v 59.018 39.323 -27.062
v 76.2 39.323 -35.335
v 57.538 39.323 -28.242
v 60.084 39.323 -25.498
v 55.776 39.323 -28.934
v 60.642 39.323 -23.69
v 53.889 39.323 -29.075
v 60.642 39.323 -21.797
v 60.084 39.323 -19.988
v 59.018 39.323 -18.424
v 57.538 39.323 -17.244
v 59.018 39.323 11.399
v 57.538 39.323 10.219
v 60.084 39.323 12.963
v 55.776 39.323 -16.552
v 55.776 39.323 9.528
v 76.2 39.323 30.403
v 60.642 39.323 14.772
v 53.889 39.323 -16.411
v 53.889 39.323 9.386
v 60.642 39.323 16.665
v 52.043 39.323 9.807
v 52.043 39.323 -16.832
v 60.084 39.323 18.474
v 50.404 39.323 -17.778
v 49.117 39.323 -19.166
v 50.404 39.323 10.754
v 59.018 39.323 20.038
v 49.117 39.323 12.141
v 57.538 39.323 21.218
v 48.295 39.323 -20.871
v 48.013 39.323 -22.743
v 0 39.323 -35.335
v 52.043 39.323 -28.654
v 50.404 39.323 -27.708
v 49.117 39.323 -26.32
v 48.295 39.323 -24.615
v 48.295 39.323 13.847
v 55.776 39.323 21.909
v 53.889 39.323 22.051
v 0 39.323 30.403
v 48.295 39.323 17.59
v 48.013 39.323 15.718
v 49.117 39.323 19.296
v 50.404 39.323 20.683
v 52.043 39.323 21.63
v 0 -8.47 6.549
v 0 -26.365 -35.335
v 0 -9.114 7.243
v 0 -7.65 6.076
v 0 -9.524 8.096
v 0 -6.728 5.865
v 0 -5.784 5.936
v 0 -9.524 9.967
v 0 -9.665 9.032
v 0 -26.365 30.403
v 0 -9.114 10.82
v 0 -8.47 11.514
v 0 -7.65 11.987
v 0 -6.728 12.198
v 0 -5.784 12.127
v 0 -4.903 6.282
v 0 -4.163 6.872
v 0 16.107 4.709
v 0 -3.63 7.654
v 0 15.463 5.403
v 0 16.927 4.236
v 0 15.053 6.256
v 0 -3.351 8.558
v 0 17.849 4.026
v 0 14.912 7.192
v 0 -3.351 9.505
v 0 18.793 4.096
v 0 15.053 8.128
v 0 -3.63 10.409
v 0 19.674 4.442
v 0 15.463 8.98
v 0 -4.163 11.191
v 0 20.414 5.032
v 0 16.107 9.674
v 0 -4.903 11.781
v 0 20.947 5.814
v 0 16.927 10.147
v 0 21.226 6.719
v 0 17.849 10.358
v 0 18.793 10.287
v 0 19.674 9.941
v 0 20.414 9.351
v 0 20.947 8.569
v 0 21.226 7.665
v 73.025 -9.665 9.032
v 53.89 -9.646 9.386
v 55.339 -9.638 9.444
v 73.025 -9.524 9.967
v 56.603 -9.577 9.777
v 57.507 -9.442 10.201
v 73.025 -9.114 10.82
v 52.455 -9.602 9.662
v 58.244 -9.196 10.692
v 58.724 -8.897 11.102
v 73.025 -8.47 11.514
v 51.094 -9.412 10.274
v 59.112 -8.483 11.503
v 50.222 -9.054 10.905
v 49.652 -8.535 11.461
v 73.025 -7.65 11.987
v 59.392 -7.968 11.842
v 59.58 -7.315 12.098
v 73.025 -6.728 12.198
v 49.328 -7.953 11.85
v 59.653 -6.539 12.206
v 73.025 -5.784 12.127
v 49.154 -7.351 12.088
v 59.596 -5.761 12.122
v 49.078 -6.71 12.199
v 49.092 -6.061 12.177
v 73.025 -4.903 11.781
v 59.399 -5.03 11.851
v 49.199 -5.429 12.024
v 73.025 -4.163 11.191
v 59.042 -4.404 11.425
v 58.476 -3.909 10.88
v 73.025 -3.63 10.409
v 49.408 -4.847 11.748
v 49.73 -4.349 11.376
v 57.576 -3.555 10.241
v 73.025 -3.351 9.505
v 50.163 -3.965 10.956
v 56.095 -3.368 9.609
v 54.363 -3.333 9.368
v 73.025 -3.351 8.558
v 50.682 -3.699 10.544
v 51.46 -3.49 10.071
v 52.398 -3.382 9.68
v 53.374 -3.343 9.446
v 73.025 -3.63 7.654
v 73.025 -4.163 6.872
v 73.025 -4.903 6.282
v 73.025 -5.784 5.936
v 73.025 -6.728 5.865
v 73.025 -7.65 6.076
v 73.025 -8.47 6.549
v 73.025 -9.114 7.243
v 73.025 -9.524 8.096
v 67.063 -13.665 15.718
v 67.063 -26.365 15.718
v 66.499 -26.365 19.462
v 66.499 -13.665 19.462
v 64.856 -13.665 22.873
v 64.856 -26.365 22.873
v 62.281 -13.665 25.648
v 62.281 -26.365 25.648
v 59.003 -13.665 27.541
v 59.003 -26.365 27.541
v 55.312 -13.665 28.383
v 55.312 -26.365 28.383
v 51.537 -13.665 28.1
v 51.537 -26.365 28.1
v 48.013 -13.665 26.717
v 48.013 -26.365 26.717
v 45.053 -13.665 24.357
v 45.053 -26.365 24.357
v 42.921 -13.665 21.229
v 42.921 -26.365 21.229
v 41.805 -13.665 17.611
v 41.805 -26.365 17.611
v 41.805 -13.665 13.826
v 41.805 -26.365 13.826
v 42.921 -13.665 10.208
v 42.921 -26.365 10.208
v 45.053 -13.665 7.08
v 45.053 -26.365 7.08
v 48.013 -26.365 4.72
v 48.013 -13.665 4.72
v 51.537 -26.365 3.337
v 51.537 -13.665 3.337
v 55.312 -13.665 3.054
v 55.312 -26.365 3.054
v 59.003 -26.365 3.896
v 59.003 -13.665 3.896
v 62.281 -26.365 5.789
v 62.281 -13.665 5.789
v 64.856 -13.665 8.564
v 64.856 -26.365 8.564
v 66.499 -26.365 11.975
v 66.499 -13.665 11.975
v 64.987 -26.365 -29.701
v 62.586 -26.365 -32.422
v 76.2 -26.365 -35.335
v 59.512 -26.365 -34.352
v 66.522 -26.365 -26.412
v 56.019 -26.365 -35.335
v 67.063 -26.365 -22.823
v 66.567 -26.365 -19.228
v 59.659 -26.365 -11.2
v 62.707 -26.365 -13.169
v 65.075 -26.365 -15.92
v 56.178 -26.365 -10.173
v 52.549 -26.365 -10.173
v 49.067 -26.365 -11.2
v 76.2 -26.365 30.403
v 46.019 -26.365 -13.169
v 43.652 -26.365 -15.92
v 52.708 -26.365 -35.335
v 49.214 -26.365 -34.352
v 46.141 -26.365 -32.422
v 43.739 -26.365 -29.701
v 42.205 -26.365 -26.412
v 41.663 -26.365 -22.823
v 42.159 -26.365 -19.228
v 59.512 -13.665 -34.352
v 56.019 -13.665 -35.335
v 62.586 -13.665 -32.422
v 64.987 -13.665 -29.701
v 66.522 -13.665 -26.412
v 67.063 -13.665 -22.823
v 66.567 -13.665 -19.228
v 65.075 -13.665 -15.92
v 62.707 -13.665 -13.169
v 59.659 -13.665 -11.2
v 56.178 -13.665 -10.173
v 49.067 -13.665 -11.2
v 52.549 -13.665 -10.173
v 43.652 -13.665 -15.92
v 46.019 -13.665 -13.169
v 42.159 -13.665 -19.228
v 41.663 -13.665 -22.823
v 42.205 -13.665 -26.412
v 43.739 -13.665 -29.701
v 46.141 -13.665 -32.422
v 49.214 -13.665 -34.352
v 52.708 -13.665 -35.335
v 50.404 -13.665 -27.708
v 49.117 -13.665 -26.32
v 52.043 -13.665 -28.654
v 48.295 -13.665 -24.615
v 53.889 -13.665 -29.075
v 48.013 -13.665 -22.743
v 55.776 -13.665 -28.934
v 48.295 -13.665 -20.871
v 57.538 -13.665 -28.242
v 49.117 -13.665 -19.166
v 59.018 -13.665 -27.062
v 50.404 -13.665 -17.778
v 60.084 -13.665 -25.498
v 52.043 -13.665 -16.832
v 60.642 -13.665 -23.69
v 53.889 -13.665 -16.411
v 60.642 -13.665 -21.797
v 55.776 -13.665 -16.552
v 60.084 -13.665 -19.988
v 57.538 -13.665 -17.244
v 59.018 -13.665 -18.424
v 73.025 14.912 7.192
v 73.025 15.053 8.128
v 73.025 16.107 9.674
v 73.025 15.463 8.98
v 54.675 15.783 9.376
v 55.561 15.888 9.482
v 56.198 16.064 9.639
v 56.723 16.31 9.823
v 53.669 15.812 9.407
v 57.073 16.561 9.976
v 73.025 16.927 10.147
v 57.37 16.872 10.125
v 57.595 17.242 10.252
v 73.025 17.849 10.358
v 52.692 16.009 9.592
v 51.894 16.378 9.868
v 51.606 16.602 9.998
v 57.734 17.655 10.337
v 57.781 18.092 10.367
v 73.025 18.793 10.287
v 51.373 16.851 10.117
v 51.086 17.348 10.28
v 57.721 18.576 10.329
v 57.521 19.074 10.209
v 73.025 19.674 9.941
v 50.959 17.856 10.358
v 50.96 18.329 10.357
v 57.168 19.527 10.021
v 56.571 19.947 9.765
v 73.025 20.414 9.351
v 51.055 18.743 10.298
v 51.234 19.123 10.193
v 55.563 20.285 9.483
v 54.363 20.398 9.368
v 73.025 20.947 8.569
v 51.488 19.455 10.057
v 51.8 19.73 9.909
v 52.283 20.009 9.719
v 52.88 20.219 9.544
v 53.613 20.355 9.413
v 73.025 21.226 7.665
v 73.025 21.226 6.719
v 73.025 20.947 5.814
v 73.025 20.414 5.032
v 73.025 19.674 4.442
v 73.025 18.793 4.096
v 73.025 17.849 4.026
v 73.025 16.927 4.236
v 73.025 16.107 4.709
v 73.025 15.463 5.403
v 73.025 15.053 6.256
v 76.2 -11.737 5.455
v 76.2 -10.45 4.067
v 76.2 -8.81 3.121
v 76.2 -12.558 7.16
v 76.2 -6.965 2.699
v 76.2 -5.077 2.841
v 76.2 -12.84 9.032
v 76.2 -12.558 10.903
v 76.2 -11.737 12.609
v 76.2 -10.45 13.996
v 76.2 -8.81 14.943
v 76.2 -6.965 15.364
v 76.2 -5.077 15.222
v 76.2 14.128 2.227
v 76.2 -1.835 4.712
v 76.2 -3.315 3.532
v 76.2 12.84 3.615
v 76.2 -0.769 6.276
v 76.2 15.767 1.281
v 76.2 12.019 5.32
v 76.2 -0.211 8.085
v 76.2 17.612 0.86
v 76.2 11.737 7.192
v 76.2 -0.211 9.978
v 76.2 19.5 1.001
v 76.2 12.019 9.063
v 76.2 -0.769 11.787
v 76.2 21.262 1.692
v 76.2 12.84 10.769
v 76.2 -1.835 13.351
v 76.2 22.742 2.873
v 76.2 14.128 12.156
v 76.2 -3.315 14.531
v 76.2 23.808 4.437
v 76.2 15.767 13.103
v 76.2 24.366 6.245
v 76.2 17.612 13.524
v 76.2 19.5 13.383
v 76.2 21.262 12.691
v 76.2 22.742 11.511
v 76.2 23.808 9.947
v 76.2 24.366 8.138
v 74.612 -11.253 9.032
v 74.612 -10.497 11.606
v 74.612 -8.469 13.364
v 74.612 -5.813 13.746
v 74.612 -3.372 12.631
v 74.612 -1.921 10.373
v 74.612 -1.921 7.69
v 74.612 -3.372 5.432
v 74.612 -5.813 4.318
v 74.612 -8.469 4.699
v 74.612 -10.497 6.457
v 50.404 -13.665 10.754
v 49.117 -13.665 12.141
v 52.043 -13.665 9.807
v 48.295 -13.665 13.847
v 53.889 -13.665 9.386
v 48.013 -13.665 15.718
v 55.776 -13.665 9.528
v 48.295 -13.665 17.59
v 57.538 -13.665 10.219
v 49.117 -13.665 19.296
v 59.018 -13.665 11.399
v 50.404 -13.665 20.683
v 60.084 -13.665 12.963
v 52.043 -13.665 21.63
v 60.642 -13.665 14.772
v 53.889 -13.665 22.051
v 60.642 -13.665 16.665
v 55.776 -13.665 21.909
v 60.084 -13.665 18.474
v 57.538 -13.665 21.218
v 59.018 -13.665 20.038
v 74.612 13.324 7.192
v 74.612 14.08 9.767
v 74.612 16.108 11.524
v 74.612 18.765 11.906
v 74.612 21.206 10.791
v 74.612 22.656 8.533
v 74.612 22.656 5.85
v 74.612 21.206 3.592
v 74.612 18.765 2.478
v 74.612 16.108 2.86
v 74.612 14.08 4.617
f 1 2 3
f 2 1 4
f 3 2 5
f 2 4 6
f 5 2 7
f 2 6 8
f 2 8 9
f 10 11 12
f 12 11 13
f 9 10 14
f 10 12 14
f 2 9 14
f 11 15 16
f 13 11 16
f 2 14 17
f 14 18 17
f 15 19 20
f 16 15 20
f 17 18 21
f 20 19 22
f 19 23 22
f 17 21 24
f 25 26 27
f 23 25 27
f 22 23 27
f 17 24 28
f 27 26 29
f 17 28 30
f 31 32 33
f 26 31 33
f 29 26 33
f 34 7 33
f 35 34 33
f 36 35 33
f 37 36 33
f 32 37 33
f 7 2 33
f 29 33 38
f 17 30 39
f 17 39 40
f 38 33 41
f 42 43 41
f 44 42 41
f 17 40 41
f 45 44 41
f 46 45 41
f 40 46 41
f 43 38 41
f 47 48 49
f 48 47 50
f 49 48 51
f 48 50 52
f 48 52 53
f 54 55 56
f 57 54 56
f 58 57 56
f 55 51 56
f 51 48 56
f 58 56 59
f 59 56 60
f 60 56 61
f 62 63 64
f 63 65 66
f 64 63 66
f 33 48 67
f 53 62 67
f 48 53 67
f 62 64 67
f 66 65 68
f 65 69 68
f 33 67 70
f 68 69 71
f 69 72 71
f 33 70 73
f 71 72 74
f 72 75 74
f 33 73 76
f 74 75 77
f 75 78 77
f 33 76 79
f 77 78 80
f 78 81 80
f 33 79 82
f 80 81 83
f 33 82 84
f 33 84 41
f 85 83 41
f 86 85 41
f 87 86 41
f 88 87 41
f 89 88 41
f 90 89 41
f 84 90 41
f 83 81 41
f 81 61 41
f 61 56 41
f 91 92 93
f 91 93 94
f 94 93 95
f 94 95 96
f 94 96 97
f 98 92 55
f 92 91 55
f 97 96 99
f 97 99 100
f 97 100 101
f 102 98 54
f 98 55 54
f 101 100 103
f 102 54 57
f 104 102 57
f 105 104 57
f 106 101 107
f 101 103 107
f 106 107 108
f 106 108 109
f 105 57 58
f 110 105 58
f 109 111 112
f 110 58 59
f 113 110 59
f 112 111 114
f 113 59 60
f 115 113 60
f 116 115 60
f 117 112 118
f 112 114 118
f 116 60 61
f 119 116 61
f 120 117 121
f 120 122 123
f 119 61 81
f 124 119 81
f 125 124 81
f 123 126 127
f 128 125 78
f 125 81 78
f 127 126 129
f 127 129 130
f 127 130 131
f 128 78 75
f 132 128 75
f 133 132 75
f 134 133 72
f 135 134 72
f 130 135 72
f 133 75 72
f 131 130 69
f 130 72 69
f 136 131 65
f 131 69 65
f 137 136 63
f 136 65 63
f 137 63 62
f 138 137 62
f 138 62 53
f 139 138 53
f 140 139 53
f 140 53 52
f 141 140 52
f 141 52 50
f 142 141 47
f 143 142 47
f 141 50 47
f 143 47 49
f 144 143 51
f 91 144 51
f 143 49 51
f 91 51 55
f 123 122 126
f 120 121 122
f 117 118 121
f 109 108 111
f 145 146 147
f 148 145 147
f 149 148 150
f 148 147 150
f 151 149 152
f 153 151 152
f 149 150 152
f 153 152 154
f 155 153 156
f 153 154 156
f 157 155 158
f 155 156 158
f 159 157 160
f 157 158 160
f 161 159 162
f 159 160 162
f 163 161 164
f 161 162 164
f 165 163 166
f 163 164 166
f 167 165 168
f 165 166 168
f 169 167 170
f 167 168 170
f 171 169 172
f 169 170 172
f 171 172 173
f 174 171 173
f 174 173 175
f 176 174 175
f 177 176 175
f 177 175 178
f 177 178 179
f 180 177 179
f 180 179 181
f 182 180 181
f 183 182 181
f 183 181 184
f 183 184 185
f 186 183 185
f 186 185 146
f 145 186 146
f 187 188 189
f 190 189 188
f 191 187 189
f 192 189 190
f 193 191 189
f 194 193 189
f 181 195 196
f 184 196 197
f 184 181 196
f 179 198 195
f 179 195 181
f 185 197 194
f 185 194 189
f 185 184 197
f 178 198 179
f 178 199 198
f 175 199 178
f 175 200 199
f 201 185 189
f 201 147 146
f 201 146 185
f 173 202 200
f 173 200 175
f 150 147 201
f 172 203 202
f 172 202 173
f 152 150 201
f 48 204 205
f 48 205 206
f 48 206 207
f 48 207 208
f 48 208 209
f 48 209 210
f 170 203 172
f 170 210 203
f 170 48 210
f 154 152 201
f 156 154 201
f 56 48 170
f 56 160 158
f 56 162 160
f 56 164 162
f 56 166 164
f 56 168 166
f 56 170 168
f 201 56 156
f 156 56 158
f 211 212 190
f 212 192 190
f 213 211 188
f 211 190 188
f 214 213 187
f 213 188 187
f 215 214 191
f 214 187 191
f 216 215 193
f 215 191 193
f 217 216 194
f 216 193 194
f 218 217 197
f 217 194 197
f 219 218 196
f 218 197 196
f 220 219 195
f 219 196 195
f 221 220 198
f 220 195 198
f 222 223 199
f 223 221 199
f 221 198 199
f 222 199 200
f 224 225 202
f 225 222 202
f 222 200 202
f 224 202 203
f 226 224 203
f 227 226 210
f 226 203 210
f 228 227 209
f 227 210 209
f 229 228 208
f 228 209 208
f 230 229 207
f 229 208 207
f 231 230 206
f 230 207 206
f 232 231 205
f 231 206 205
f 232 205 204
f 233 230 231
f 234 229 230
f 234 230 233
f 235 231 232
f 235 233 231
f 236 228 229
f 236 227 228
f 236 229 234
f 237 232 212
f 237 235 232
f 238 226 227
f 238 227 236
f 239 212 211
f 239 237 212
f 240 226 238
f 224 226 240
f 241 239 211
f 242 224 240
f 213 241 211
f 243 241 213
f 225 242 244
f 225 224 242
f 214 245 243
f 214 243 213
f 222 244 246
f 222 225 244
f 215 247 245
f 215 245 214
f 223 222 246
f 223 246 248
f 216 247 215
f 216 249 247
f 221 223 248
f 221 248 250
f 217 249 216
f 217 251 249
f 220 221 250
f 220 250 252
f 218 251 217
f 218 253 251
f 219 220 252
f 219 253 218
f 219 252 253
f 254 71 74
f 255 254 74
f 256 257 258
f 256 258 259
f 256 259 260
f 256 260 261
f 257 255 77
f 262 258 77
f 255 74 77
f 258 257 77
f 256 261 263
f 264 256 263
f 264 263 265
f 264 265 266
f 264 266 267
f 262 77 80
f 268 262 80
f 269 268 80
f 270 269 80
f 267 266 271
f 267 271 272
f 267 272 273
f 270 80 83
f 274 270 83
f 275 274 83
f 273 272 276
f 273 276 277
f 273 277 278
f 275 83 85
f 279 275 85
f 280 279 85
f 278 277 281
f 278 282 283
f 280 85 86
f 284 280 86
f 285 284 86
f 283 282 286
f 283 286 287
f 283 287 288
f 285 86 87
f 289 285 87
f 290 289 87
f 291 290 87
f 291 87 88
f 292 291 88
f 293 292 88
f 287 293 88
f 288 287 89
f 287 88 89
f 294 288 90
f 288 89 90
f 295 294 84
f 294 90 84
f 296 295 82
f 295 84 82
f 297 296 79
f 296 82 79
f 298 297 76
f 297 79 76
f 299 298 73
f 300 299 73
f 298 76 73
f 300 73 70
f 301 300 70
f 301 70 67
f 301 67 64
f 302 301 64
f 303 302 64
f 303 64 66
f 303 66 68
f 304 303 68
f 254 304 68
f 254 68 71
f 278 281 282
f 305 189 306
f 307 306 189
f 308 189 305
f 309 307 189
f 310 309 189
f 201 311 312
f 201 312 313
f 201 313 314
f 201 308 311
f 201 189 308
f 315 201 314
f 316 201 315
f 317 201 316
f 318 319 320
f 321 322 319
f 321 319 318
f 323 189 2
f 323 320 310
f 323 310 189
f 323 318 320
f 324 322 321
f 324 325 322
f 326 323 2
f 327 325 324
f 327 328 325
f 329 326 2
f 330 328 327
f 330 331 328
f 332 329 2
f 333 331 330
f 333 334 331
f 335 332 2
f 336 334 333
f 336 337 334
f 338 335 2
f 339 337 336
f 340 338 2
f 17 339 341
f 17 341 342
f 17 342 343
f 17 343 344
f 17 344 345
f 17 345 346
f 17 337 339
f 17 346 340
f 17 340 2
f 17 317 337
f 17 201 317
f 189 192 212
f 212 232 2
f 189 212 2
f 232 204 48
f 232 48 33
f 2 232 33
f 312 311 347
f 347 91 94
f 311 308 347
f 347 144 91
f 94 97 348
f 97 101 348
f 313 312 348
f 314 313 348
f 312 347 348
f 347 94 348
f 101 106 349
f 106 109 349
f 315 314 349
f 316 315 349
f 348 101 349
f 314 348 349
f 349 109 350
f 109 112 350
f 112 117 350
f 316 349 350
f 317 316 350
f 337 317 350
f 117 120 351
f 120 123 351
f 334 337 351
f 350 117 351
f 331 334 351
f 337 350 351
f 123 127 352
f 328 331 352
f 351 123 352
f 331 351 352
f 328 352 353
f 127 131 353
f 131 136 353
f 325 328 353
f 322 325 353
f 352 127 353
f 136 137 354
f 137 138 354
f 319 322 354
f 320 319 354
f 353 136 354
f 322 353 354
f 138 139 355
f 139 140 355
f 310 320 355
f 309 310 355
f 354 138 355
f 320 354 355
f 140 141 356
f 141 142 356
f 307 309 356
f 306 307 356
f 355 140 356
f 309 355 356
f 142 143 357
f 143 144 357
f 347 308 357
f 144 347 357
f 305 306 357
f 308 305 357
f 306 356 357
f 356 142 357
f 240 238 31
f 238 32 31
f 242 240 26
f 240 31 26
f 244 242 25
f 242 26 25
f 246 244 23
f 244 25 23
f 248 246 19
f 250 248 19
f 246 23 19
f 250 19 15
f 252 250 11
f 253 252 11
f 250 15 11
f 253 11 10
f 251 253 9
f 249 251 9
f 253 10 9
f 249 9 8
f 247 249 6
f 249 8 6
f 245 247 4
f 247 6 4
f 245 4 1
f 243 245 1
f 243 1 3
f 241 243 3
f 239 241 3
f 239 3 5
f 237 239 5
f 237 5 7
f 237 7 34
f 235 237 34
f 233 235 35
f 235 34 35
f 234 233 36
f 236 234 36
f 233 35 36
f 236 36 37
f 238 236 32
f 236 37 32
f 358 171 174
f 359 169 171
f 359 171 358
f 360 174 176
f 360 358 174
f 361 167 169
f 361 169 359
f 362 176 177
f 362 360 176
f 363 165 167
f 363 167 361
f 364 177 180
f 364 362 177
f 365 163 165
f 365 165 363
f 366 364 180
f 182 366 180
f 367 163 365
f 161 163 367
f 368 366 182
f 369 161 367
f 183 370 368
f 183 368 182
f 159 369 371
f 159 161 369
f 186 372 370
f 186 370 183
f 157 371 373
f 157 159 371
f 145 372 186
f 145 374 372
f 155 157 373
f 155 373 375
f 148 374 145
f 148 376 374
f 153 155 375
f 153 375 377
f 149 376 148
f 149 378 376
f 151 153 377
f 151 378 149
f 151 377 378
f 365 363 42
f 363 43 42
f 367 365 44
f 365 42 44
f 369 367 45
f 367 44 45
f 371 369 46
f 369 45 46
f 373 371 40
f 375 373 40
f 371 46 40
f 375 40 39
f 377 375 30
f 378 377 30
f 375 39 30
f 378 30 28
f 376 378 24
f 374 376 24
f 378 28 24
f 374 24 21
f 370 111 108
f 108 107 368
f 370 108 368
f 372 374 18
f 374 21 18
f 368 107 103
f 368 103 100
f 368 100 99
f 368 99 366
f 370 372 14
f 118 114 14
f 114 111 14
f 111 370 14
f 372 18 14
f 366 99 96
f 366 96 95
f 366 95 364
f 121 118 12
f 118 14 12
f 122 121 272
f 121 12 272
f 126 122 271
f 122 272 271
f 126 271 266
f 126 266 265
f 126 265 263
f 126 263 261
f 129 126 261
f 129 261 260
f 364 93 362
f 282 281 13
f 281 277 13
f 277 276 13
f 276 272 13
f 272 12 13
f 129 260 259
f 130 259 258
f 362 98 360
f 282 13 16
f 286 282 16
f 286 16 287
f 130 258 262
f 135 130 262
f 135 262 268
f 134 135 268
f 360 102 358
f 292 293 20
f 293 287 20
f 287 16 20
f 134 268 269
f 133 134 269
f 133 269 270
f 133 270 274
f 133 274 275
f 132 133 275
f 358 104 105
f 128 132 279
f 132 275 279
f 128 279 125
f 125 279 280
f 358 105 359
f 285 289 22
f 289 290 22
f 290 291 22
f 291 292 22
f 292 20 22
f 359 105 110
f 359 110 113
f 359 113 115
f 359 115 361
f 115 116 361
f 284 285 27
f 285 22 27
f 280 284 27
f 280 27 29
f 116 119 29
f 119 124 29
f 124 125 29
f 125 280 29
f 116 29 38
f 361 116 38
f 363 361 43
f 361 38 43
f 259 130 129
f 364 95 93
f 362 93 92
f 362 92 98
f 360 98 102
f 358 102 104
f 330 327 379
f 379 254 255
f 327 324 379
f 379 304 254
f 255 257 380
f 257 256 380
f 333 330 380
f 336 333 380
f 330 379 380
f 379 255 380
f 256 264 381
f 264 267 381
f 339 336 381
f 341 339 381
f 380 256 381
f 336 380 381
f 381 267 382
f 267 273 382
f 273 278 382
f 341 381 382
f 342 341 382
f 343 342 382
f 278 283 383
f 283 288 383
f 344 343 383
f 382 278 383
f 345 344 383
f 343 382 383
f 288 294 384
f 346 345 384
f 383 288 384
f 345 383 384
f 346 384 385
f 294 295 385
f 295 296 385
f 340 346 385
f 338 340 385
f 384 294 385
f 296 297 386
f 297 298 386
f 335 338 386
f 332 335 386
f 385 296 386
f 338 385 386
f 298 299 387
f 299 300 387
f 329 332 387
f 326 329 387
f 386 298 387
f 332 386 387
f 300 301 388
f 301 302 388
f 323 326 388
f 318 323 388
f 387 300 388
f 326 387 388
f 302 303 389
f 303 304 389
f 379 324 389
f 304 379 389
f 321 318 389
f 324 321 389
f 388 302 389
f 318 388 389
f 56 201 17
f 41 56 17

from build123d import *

# Parameters (mm, degrees)
F0_W           = 65.687917
F0_H           = 65.738029
F1_DEPTH       = 76.2
F3_D           = 6.35
F3_CSINK_D     = 12.7
F3_CSINK_ANGLE = 90
F5_D           = 12.7
F5_CBORE_D     = 25.4
F5_CBORE_DEPTH = 12.7


with BuildPart() as f1:
    # F0 (on Right) → F1 (new body)
    with BuildSketch(Plane.YZ):
        with Locations((6.479423, -2.465733)):
            Rectangle(F0_W, F0_H)
    extrude(amount=F1_DEPTH)

    # F3 (through all)
    with Locations(Plane.YZ.offset(76.2)):
        with Locations((-6.490372, 9.031592), (18.086735, 7.191747)):
            CounterSinkHole(F3_D / 2, F3_CSINK_D / 2, counter_sink_angle=F3_CSINK_ANGLE)

    # F5 (through all)
    with Locations(Plane.XZ.offset(26.364535)):
        with Locations((54.363161, 15.718481), (54.363161, -22.743117)):
            CounterBoreHole(F5_D / 2, F5_CBORE_D / 2, F5_CBORE_DEPTH)


solid = f1.part
